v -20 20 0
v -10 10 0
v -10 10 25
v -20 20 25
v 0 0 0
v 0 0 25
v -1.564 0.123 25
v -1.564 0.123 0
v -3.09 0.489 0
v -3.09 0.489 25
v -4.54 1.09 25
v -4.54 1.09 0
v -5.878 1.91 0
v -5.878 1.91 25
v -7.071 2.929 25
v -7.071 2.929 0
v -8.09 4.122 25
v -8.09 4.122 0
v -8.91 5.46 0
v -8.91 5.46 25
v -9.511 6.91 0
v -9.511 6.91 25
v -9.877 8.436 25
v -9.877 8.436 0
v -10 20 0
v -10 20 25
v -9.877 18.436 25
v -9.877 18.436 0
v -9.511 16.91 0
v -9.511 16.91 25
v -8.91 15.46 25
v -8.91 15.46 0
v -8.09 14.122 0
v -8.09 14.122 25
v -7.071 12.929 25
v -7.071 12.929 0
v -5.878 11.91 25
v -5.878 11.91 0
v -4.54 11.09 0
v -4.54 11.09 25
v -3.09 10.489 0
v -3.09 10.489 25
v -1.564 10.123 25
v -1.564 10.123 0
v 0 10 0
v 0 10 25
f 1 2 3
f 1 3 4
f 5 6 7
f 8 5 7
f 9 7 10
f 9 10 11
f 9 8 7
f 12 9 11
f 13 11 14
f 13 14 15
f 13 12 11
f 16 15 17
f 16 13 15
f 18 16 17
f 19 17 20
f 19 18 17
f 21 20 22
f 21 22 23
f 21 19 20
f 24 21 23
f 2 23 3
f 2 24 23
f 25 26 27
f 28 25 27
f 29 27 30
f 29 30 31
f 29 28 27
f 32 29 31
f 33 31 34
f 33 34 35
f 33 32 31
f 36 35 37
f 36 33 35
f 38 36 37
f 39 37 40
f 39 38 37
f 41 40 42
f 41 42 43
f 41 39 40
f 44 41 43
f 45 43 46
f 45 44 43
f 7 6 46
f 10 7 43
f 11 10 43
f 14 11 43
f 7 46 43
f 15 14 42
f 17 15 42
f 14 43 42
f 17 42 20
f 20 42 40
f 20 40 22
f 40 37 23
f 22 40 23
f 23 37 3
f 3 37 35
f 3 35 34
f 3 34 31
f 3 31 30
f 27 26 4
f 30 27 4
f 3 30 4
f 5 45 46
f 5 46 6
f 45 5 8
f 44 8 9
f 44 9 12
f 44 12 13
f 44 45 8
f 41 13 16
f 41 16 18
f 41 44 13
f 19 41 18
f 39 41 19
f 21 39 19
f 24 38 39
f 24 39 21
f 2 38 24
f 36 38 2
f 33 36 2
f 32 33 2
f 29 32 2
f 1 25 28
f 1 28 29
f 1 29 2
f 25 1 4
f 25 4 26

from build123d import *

# Parameters (mm, degrees)
BOSS_EXTRUDE1_DEPTH = 25


with BuildPart() as part:
    # Sketch1 → Boss-Extrude1 (new body)
    with BuildSketch(Plane.XY):
        with BuildLine():
            Line((-20, 20), (-10, 20))
            ThreePointArc((-10, 20), (-7.071067812, 12.928932188), (0, 10))
            Line((0, 10), (0, 0))
            ThreePointArc((0, 0), (-7.071067812, 2.928932188), (-10, 10))
            Line((-10, 10), (-20, 20))
        make_face()
    extrude(amount=BOSS_EXTRUDE1_DEPTH)


solid = part.part
